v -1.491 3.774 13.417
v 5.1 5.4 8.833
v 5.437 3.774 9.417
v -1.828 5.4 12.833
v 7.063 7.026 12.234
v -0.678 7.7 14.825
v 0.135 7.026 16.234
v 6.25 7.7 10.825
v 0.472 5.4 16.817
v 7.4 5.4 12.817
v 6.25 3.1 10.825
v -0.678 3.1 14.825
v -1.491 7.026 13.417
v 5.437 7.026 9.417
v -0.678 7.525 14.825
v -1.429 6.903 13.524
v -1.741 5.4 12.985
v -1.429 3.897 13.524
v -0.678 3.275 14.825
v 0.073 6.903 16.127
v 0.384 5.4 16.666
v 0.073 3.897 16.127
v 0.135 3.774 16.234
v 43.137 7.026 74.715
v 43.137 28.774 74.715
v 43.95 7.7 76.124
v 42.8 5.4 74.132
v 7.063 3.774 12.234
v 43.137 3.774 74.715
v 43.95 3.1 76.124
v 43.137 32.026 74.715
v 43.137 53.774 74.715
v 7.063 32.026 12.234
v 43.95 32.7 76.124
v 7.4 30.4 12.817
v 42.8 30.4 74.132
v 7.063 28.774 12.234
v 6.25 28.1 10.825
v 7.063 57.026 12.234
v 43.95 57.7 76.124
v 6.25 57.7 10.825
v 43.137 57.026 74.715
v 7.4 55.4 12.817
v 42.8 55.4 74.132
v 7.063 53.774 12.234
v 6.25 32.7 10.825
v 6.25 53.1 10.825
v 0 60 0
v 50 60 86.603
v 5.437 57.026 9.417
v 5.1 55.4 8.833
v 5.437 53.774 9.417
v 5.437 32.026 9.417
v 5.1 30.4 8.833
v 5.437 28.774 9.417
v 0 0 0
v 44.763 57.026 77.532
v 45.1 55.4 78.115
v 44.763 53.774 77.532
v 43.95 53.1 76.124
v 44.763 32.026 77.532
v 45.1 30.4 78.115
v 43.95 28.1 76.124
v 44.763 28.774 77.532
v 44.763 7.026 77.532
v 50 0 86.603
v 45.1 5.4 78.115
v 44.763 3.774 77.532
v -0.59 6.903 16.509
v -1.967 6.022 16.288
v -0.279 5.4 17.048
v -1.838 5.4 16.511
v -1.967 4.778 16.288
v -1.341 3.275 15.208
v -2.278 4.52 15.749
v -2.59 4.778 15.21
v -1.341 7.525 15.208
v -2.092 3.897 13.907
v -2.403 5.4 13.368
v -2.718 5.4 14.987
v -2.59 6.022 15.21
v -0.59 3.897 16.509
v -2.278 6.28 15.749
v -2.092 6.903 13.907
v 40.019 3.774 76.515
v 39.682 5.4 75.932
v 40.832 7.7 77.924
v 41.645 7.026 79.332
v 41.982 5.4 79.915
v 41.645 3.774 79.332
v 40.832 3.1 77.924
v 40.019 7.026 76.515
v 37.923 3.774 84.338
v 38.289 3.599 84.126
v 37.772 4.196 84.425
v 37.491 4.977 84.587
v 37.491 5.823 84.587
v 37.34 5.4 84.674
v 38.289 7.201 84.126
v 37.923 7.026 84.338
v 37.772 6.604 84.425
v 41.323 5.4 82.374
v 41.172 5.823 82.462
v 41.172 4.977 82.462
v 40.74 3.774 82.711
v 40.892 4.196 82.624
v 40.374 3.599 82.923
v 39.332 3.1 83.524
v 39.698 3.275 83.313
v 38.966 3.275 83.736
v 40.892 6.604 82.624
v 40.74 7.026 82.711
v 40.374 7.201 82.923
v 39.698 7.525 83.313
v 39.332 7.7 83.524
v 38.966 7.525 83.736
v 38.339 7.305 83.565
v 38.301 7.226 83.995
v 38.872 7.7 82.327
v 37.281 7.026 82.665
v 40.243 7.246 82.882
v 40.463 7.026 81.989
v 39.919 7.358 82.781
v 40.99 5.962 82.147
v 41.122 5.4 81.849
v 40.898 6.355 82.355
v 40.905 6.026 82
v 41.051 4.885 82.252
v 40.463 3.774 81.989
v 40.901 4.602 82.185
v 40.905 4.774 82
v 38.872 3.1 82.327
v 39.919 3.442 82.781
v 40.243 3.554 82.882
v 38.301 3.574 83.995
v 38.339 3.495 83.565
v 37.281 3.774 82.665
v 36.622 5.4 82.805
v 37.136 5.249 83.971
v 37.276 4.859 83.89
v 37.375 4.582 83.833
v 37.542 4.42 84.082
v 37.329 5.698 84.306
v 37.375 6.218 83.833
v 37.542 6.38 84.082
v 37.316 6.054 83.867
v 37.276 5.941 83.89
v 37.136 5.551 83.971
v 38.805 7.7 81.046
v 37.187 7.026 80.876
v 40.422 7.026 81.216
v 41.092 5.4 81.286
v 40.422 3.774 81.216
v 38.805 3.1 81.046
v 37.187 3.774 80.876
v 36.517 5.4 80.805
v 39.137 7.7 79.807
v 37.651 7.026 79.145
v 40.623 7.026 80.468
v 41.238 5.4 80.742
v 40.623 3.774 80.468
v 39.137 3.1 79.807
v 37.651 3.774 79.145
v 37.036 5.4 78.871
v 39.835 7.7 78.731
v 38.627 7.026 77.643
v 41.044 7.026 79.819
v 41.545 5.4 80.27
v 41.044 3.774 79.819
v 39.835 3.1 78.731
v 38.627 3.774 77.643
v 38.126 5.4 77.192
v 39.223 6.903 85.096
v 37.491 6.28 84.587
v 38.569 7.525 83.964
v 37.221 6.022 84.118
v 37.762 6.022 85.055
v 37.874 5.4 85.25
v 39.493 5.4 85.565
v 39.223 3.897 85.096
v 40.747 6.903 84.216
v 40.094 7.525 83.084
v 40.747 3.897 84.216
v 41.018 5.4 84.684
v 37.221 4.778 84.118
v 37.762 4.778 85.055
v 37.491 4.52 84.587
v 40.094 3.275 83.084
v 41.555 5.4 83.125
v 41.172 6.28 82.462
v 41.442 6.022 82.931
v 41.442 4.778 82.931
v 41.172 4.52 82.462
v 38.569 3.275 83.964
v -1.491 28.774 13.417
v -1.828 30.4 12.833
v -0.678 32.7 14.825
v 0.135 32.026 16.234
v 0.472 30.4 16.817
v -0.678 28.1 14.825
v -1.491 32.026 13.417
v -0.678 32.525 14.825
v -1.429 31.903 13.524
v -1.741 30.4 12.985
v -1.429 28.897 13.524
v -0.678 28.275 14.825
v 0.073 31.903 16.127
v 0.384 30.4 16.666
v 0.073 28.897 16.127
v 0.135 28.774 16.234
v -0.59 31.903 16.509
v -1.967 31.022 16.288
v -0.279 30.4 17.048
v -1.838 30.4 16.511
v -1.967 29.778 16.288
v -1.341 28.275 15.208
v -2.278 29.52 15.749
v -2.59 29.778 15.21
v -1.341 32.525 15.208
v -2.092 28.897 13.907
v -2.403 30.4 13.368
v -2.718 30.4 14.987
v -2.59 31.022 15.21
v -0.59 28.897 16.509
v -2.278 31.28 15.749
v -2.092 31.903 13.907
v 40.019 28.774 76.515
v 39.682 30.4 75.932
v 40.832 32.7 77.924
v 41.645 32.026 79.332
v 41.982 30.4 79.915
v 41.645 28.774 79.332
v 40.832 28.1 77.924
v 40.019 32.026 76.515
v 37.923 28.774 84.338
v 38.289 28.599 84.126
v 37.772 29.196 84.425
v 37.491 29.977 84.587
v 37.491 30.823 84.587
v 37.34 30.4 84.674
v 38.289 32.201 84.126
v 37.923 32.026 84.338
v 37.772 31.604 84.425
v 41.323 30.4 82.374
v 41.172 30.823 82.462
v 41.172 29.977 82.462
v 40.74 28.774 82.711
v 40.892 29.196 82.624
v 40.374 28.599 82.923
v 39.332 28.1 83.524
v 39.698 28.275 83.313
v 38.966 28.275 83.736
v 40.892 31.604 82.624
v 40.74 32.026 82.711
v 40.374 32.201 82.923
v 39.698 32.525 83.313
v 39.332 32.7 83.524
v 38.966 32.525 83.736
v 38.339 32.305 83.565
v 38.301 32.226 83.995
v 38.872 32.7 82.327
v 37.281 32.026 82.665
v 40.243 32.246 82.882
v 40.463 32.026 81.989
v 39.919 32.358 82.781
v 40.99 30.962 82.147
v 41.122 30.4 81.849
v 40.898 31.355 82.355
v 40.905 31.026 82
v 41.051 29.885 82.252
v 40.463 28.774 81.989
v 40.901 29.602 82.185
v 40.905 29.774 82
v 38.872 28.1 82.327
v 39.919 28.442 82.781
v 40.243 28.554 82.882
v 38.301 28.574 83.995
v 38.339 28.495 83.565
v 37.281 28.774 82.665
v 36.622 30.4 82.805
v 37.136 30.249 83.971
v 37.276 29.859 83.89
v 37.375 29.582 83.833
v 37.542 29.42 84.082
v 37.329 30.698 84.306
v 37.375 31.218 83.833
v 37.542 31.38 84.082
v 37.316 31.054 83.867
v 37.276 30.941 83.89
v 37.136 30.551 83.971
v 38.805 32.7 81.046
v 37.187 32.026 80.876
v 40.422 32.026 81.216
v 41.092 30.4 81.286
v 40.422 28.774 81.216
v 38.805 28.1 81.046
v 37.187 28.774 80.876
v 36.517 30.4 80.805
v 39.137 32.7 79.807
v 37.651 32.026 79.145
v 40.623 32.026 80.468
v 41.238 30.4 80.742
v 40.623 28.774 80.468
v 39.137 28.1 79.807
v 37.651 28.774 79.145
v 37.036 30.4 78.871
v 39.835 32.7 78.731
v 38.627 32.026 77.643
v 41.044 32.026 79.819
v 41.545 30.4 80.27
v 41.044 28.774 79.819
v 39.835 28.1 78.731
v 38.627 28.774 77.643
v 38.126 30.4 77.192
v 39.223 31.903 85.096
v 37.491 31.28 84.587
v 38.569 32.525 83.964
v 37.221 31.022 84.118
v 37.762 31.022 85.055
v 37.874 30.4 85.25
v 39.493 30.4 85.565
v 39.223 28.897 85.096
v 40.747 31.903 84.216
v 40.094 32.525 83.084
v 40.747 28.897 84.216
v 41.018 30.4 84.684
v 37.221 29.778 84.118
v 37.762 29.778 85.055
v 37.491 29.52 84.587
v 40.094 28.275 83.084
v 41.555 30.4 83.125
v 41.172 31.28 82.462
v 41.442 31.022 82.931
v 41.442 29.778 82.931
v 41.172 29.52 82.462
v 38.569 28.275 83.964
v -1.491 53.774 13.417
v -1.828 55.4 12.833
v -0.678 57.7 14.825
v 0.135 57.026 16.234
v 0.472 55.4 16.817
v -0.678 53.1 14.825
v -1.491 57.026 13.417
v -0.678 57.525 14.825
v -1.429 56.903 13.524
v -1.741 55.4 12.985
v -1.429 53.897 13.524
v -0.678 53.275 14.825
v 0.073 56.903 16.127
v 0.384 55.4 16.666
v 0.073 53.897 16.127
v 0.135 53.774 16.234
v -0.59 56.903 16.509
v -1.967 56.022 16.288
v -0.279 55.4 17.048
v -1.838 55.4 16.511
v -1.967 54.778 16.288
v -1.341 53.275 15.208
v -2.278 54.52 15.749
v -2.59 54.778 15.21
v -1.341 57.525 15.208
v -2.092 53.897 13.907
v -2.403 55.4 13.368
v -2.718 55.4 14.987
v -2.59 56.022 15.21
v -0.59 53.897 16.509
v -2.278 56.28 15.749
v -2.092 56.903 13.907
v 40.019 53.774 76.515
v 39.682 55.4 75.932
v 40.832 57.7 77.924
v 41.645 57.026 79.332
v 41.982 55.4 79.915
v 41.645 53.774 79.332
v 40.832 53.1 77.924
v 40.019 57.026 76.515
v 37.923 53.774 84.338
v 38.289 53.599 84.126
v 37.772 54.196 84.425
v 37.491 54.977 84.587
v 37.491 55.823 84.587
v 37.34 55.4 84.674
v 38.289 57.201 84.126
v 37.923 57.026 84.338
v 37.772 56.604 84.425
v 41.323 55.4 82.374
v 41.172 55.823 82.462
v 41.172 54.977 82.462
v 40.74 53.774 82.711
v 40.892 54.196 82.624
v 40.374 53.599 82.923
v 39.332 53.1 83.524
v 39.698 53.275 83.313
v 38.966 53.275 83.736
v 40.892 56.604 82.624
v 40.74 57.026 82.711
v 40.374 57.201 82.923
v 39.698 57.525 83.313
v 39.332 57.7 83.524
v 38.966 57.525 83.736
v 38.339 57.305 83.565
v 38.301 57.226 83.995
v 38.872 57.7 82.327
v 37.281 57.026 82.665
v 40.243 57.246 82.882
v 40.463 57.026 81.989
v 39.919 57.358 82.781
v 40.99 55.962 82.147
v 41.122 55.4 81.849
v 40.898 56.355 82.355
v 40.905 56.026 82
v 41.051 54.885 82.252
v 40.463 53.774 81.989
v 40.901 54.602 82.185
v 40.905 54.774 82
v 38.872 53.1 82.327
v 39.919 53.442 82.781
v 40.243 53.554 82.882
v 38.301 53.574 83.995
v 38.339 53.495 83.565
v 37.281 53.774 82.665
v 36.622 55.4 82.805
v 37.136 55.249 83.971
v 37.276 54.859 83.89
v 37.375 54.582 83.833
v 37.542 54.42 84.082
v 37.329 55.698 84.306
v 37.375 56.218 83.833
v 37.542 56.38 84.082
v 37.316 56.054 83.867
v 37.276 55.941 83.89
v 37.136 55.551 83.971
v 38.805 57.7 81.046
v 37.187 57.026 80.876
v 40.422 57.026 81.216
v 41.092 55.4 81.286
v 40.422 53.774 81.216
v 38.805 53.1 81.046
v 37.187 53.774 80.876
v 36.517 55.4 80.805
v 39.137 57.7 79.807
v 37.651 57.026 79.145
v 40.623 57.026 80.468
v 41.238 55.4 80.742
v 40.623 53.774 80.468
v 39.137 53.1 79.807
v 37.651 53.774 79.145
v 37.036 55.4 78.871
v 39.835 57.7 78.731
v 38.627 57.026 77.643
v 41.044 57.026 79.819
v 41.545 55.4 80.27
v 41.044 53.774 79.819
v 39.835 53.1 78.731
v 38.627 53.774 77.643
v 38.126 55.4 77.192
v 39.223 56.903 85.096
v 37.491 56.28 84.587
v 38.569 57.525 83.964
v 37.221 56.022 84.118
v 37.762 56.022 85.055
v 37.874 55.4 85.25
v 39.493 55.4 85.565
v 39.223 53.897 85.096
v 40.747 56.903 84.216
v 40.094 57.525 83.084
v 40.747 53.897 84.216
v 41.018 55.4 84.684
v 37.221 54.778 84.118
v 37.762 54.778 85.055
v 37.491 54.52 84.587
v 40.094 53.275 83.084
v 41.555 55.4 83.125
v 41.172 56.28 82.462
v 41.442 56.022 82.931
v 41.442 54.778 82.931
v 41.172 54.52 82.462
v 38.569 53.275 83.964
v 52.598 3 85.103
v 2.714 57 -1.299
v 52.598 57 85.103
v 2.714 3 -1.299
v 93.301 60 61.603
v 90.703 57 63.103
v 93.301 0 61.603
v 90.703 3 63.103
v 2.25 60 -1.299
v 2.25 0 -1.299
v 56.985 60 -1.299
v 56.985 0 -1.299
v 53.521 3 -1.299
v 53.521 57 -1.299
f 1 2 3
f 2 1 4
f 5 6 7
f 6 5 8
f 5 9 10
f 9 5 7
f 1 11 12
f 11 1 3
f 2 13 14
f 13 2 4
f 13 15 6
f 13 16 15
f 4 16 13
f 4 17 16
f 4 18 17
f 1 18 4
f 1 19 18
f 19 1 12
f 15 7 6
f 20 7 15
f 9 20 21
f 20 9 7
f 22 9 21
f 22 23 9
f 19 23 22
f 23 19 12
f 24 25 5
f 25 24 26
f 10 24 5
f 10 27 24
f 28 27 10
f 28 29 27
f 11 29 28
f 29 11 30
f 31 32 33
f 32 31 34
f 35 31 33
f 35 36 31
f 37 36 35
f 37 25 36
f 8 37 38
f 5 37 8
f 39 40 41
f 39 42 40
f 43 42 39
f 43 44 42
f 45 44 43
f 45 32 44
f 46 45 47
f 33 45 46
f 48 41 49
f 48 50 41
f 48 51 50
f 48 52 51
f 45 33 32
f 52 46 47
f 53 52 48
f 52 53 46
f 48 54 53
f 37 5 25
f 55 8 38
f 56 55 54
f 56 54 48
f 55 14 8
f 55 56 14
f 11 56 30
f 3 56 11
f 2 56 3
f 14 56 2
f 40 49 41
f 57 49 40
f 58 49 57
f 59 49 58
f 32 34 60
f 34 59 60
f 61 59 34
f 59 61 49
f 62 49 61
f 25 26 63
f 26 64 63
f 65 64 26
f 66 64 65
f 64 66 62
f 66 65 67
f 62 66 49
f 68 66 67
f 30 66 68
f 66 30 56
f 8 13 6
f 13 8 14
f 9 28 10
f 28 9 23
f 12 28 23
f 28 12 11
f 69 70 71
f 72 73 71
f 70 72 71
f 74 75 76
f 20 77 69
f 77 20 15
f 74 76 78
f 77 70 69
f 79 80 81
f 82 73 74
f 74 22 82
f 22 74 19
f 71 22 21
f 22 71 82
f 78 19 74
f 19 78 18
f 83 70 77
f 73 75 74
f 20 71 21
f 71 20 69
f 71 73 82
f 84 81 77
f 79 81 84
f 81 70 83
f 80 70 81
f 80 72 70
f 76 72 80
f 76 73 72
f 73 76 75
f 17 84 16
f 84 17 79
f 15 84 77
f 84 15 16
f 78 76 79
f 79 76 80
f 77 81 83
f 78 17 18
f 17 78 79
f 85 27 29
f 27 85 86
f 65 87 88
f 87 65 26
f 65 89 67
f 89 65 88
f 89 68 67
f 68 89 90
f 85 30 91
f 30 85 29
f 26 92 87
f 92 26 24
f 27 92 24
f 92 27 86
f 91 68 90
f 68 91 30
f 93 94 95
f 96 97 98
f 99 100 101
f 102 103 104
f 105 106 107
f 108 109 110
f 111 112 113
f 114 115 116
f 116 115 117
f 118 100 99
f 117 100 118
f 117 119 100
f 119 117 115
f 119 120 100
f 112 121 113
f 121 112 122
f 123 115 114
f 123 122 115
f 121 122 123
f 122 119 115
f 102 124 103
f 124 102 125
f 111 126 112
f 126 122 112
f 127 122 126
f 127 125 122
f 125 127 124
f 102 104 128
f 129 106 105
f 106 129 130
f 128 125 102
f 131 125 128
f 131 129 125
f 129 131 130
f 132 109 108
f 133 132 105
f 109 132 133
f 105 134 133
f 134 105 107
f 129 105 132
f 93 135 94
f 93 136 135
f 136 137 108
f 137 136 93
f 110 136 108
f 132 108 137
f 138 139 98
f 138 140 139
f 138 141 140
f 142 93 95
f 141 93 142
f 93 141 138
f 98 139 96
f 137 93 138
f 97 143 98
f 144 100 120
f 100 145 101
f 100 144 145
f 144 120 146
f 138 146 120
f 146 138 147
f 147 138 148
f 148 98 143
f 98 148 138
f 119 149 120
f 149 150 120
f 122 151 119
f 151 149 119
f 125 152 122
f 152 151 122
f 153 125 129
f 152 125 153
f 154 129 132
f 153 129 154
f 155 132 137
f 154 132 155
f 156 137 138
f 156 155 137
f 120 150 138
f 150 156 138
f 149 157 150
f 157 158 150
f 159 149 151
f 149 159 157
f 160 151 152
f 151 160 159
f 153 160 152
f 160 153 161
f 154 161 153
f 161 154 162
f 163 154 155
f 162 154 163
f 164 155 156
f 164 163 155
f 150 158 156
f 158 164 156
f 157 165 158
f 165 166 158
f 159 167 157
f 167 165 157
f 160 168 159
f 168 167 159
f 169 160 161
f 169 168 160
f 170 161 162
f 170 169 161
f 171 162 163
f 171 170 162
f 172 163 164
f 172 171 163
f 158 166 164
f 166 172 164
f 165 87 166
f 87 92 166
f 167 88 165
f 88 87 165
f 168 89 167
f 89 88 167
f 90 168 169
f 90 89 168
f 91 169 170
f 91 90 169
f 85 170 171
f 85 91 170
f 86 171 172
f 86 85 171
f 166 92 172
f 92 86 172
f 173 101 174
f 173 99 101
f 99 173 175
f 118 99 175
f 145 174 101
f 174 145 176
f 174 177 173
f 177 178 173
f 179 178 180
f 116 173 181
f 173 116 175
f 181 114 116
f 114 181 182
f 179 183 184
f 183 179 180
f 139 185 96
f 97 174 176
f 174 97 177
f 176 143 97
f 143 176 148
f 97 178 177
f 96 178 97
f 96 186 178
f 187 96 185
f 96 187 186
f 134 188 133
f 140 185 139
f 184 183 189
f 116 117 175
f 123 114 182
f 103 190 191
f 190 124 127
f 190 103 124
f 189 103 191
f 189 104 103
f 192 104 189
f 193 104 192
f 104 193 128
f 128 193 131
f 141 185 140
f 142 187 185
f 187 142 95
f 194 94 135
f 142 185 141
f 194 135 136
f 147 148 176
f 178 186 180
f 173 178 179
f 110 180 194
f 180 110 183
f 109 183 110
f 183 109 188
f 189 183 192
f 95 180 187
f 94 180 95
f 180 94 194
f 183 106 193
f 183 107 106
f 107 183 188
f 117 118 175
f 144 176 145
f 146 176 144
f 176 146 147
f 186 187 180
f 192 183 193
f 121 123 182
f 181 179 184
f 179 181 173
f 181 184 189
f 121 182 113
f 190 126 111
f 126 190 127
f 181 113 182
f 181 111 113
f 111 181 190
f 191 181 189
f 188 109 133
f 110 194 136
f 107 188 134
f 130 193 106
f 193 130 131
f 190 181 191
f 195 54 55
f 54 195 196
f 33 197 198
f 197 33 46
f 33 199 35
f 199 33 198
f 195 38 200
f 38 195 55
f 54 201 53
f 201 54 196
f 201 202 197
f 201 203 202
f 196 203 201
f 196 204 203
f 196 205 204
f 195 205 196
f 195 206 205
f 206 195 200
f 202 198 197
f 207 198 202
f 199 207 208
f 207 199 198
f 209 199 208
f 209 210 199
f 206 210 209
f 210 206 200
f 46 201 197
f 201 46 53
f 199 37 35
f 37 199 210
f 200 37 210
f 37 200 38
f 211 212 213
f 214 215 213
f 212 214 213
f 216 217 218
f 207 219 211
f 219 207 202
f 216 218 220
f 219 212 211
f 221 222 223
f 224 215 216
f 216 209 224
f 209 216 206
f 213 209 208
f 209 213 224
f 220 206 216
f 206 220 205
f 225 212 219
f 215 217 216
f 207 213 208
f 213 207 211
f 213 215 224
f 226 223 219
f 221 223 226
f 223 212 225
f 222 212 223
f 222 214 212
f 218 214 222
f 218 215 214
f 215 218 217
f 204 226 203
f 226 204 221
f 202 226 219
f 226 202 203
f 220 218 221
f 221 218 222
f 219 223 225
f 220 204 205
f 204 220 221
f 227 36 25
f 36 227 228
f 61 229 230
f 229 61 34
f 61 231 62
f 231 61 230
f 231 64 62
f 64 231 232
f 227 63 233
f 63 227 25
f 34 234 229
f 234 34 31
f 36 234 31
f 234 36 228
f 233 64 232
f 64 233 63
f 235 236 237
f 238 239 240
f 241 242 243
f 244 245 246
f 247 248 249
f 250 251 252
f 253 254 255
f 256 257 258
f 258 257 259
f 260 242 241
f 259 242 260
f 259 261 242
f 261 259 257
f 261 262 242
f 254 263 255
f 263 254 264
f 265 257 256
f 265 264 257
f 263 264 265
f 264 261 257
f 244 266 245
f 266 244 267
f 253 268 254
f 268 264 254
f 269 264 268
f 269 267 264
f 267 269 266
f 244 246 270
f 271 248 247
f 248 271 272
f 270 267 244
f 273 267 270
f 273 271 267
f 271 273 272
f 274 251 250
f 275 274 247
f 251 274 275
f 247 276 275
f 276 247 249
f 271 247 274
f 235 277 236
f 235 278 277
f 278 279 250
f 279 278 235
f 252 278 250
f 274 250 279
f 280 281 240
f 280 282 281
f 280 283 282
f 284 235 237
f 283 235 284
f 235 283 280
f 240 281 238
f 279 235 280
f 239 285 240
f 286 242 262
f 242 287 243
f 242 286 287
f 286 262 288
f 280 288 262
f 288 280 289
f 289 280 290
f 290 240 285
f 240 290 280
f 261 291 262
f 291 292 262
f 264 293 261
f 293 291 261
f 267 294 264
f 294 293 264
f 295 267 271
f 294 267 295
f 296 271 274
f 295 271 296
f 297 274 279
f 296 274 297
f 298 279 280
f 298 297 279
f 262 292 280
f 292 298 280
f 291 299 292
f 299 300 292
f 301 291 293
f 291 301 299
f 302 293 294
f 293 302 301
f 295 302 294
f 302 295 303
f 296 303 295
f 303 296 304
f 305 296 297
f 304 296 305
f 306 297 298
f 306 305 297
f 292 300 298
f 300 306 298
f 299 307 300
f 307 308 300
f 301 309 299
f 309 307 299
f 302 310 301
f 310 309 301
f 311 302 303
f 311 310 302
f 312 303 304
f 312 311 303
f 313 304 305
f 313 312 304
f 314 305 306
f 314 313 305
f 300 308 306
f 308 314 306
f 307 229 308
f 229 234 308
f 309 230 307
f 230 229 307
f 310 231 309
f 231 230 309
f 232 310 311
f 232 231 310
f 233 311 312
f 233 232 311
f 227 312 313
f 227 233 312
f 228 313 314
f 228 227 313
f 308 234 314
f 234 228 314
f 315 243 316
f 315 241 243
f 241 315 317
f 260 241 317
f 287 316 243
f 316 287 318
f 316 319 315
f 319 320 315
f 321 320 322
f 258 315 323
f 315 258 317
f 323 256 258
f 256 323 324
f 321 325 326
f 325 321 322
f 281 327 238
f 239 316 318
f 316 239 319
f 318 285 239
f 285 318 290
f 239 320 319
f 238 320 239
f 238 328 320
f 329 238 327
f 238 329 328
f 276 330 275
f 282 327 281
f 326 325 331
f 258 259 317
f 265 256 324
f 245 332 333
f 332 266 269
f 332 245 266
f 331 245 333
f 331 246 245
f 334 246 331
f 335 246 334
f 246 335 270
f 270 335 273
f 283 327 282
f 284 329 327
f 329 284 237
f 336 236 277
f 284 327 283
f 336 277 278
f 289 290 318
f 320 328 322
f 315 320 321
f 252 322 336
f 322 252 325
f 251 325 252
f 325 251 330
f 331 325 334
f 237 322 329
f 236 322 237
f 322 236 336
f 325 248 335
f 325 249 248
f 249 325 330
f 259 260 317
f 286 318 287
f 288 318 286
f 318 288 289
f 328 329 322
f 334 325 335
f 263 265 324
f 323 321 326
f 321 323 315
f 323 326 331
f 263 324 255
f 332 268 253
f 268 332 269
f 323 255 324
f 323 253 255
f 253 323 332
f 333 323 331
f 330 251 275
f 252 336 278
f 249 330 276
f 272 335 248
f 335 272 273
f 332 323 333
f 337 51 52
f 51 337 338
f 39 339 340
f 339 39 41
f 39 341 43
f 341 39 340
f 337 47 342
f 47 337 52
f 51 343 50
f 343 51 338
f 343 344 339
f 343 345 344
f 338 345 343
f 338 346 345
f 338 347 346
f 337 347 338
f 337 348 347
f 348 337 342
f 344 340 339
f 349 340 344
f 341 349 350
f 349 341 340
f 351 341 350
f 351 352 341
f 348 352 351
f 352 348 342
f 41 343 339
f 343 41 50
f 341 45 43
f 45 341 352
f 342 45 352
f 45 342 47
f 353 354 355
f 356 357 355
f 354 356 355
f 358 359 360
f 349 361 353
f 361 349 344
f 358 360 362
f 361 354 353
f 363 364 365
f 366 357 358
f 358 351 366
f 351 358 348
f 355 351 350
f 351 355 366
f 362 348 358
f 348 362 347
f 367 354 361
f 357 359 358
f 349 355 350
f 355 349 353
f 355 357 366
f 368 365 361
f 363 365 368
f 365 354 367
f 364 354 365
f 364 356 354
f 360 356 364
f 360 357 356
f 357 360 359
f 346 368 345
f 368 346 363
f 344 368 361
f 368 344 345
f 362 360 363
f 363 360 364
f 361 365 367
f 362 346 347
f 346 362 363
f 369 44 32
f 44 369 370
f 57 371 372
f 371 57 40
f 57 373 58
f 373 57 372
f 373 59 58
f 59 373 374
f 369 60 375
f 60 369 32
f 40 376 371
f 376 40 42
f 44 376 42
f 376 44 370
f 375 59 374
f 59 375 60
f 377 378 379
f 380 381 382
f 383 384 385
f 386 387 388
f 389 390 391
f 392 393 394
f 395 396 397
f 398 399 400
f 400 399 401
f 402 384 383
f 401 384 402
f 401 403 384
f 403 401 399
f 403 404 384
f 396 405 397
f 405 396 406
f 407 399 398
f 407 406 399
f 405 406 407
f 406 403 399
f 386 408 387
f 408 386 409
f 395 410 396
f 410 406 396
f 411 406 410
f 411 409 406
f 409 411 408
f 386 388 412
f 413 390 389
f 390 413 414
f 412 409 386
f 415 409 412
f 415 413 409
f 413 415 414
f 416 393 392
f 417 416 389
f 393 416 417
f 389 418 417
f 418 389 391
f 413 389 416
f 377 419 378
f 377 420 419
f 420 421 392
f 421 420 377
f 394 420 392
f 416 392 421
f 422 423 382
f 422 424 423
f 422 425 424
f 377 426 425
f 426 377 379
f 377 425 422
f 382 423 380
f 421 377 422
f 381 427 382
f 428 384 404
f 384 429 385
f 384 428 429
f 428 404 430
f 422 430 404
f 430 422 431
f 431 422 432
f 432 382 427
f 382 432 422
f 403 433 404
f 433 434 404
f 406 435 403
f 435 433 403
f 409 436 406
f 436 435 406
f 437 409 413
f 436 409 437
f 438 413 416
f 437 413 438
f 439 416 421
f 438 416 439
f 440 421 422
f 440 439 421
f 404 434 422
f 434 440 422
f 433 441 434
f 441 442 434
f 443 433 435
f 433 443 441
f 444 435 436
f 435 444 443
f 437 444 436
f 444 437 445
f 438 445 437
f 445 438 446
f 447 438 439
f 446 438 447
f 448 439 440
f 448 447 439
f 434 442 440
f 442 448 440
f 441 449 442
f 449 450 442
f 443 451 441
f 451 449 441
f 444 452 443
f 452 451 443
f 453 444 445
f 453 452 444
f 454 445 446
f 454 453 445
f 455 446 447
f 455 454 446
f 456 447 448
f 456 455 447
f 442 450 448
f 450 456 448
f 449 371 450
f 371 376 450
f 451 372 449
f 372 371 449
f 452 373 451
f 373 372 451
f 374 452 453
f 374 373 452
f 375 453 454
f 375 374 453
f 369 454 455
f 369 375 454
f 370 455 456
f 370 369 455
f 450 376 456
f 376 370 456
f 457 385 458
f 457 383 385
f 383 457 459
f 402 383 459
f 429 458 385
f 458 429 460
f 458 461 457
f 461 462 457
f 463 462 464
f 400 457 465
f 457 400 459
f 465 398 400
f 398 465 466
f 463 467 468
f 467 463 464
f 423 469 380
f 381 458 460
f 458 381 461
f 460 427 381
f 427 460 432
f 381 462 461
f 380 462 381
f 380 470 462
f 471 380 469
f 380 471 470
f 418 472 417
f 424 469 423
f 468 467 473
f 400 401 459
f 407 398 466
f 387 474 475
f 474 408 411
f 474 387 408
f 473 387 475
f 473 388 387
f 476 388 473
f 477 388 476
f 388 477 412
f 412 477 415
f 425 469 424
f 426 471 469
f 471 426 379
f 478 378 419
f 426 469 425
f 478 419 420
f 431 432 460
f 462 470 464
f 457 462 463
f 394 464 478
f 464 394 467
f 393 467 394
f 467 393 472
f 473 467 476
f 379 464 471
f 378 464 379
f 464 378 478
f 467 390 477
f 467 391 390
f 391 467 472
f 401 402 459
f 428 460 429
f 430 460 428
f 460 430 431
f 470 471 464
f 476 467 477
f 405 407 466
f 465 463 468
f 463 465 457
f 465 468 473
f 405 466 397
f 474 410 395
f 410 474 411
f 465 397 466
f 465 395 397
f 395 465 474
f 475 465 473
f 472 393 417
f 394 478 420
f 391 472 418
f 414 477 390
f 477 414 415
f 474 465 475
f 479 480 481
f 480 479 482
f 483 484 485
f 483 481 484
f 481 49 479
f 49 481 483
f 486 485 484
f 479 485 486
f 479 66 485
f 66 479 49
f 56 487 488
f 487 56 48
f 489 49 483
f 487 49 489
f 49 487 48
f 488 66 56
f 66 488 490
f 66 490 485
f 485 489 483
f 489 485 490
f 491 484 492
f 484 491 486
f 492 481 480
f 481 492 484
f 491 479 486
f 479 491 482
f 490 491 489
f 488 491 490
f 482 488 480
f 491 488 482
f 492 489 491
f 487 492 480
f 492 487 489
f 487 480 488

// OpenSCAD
// file: pegboard.scad
/* pin dimentions */
pin_diameter = 5;
pin_spacing = 25;
pin_length = 10;
pin_tip_height = 2;
pin_clearance = 0.4;

/* pegboard width */
pegboard_width = 3;
pegboard_clearance = 0.6;

/* base width */
base_width = 3;

/* angle */
angle = 30;

/* DON'T TOUCH BELOW HERE! Internal values! */
epsilon = 0.1;
pin_diameter_ = pin_diameter - pin_clearance;


module torus(r1, r2, angle=360) {
    rotate_extrude(angle=angle) translate([r2, 0, 0]) circle(r=r1);
}

module pin() {
    union() {
        cylinder(h=pin_length - pin_tip_height, r=pin_diameter_/2);
        translate([0, 0, pin_length - pin_tip_height])
            scale([1, 1, (pin_tip_height * 2 / pin_diameter_)])
                sphere(d=pin_diameter_);
    }
}

module curvy_pin() {
    _pegboard_width = pegboard_width + pegboard_clearance;

    torus_outer_radius = pin_length - _pegboard_width;
    torus_r1 = pin_diameter_/2;
    torus_r2 = torus_outer_radius - torus_r1;

    union() {
        translate([0, 0, 0])
            cylinder(h=_pegboard_width, r=pin_diameter_/2);

        translate([torus_outer_radius/2 - torus_r1,
                   0,
                   torus_outer_radius/2 + _pegboard_width])
            rotate([90, 0, 0])
                translate([torus_outer_radius/2, -torus_outer_radius/2, 0])
                    rotate([0, 0, 90])
                        torus(r1=torus_r1, r2=torus_r2, angle=90);

        translate([torus_outer_radius-torus_r1 + 0*_pegboard_width/2, 0, pin_length - pin_diameter_/2])
            scale([(pin_tip_height*2/pin_diameter_), 1, 1])
                sphere(d=pin_diameter_);
    }
}

module pin_pair(spacing=pin_spacing + pin_clearance) {
    translate([0, pin_diameter_/2, pin_diameter_/2])
        rotate([0, -90, 0])
            union() {
                pin();
                translate([spacing, 0, 0]) curvy_pin();
        }
}

module fill_with_pin_pairs(width, height) {
    spacing_between = pin_spacing - pin_diameter_;

    pin_count_horizontal = floor((width + spacing_between) / (pin_diameter_ + spacing_between));
    padding_horizontal = (width - (pin_count_horizontal * pin_diameter_ + (pin_count_horizontal - 1) * spacing_between)) / 2;

    pin_count_vertical = floor((height + spacing_between) / (pin_diameter_ + spacing_between));
    spacing_vertical = (pin_count_vertical - 1) * pin_spacing;
    padding_vertical = (height - spacing_vertical - pin_diameter_) / 2;

    translate([0, padding_horizontal, padding_vertical]) {
        for (i = [1:pin_count_horizontal]) {
            translate([0, (i-1) * pin_spacing + pin_clearance, 0])
                pin_pair(spacing_vertical + pin_clearance);
        }
    }
}

module base(width, height) {
    union(){
        cube([base_width, width, height]);
        fill_with_pin_pairs(width, height);
    }
}
// main file
include <pegboard.scad>

open_bin_height = 100;
open_bin_width = 60;
open_bin_depth = 50;
open_bin_thickness = 3;

module open_bin(
    dimensions=[open_bin_depth, open_bin_width, open_bin_height],
    thickness=open_bin_thickness
    ) {
    outer_cube = dimensions;
    inner_cube = dimensions - 2 * [thickness, thickness, -epsilon];
    angle_cube = [dimensions.z * 2, dimensions.y + 2 * epsilon, dimensions.z];

    difference() {
        union() {
            base(dimensions.y, dimensions.z);
            difference() {
                cube(outer_cube);
                translate([thickness, thickness, -epsilon])
                    cube(inner_cube);
            }
        }

        translate([0, -epsilon, -thickness * sin(angle)])
            rotate([0, 1 * (90 - angle), 0])
                cube(angle_cube);
    }
}

rotate([0, angle, 0]) open_bin();
